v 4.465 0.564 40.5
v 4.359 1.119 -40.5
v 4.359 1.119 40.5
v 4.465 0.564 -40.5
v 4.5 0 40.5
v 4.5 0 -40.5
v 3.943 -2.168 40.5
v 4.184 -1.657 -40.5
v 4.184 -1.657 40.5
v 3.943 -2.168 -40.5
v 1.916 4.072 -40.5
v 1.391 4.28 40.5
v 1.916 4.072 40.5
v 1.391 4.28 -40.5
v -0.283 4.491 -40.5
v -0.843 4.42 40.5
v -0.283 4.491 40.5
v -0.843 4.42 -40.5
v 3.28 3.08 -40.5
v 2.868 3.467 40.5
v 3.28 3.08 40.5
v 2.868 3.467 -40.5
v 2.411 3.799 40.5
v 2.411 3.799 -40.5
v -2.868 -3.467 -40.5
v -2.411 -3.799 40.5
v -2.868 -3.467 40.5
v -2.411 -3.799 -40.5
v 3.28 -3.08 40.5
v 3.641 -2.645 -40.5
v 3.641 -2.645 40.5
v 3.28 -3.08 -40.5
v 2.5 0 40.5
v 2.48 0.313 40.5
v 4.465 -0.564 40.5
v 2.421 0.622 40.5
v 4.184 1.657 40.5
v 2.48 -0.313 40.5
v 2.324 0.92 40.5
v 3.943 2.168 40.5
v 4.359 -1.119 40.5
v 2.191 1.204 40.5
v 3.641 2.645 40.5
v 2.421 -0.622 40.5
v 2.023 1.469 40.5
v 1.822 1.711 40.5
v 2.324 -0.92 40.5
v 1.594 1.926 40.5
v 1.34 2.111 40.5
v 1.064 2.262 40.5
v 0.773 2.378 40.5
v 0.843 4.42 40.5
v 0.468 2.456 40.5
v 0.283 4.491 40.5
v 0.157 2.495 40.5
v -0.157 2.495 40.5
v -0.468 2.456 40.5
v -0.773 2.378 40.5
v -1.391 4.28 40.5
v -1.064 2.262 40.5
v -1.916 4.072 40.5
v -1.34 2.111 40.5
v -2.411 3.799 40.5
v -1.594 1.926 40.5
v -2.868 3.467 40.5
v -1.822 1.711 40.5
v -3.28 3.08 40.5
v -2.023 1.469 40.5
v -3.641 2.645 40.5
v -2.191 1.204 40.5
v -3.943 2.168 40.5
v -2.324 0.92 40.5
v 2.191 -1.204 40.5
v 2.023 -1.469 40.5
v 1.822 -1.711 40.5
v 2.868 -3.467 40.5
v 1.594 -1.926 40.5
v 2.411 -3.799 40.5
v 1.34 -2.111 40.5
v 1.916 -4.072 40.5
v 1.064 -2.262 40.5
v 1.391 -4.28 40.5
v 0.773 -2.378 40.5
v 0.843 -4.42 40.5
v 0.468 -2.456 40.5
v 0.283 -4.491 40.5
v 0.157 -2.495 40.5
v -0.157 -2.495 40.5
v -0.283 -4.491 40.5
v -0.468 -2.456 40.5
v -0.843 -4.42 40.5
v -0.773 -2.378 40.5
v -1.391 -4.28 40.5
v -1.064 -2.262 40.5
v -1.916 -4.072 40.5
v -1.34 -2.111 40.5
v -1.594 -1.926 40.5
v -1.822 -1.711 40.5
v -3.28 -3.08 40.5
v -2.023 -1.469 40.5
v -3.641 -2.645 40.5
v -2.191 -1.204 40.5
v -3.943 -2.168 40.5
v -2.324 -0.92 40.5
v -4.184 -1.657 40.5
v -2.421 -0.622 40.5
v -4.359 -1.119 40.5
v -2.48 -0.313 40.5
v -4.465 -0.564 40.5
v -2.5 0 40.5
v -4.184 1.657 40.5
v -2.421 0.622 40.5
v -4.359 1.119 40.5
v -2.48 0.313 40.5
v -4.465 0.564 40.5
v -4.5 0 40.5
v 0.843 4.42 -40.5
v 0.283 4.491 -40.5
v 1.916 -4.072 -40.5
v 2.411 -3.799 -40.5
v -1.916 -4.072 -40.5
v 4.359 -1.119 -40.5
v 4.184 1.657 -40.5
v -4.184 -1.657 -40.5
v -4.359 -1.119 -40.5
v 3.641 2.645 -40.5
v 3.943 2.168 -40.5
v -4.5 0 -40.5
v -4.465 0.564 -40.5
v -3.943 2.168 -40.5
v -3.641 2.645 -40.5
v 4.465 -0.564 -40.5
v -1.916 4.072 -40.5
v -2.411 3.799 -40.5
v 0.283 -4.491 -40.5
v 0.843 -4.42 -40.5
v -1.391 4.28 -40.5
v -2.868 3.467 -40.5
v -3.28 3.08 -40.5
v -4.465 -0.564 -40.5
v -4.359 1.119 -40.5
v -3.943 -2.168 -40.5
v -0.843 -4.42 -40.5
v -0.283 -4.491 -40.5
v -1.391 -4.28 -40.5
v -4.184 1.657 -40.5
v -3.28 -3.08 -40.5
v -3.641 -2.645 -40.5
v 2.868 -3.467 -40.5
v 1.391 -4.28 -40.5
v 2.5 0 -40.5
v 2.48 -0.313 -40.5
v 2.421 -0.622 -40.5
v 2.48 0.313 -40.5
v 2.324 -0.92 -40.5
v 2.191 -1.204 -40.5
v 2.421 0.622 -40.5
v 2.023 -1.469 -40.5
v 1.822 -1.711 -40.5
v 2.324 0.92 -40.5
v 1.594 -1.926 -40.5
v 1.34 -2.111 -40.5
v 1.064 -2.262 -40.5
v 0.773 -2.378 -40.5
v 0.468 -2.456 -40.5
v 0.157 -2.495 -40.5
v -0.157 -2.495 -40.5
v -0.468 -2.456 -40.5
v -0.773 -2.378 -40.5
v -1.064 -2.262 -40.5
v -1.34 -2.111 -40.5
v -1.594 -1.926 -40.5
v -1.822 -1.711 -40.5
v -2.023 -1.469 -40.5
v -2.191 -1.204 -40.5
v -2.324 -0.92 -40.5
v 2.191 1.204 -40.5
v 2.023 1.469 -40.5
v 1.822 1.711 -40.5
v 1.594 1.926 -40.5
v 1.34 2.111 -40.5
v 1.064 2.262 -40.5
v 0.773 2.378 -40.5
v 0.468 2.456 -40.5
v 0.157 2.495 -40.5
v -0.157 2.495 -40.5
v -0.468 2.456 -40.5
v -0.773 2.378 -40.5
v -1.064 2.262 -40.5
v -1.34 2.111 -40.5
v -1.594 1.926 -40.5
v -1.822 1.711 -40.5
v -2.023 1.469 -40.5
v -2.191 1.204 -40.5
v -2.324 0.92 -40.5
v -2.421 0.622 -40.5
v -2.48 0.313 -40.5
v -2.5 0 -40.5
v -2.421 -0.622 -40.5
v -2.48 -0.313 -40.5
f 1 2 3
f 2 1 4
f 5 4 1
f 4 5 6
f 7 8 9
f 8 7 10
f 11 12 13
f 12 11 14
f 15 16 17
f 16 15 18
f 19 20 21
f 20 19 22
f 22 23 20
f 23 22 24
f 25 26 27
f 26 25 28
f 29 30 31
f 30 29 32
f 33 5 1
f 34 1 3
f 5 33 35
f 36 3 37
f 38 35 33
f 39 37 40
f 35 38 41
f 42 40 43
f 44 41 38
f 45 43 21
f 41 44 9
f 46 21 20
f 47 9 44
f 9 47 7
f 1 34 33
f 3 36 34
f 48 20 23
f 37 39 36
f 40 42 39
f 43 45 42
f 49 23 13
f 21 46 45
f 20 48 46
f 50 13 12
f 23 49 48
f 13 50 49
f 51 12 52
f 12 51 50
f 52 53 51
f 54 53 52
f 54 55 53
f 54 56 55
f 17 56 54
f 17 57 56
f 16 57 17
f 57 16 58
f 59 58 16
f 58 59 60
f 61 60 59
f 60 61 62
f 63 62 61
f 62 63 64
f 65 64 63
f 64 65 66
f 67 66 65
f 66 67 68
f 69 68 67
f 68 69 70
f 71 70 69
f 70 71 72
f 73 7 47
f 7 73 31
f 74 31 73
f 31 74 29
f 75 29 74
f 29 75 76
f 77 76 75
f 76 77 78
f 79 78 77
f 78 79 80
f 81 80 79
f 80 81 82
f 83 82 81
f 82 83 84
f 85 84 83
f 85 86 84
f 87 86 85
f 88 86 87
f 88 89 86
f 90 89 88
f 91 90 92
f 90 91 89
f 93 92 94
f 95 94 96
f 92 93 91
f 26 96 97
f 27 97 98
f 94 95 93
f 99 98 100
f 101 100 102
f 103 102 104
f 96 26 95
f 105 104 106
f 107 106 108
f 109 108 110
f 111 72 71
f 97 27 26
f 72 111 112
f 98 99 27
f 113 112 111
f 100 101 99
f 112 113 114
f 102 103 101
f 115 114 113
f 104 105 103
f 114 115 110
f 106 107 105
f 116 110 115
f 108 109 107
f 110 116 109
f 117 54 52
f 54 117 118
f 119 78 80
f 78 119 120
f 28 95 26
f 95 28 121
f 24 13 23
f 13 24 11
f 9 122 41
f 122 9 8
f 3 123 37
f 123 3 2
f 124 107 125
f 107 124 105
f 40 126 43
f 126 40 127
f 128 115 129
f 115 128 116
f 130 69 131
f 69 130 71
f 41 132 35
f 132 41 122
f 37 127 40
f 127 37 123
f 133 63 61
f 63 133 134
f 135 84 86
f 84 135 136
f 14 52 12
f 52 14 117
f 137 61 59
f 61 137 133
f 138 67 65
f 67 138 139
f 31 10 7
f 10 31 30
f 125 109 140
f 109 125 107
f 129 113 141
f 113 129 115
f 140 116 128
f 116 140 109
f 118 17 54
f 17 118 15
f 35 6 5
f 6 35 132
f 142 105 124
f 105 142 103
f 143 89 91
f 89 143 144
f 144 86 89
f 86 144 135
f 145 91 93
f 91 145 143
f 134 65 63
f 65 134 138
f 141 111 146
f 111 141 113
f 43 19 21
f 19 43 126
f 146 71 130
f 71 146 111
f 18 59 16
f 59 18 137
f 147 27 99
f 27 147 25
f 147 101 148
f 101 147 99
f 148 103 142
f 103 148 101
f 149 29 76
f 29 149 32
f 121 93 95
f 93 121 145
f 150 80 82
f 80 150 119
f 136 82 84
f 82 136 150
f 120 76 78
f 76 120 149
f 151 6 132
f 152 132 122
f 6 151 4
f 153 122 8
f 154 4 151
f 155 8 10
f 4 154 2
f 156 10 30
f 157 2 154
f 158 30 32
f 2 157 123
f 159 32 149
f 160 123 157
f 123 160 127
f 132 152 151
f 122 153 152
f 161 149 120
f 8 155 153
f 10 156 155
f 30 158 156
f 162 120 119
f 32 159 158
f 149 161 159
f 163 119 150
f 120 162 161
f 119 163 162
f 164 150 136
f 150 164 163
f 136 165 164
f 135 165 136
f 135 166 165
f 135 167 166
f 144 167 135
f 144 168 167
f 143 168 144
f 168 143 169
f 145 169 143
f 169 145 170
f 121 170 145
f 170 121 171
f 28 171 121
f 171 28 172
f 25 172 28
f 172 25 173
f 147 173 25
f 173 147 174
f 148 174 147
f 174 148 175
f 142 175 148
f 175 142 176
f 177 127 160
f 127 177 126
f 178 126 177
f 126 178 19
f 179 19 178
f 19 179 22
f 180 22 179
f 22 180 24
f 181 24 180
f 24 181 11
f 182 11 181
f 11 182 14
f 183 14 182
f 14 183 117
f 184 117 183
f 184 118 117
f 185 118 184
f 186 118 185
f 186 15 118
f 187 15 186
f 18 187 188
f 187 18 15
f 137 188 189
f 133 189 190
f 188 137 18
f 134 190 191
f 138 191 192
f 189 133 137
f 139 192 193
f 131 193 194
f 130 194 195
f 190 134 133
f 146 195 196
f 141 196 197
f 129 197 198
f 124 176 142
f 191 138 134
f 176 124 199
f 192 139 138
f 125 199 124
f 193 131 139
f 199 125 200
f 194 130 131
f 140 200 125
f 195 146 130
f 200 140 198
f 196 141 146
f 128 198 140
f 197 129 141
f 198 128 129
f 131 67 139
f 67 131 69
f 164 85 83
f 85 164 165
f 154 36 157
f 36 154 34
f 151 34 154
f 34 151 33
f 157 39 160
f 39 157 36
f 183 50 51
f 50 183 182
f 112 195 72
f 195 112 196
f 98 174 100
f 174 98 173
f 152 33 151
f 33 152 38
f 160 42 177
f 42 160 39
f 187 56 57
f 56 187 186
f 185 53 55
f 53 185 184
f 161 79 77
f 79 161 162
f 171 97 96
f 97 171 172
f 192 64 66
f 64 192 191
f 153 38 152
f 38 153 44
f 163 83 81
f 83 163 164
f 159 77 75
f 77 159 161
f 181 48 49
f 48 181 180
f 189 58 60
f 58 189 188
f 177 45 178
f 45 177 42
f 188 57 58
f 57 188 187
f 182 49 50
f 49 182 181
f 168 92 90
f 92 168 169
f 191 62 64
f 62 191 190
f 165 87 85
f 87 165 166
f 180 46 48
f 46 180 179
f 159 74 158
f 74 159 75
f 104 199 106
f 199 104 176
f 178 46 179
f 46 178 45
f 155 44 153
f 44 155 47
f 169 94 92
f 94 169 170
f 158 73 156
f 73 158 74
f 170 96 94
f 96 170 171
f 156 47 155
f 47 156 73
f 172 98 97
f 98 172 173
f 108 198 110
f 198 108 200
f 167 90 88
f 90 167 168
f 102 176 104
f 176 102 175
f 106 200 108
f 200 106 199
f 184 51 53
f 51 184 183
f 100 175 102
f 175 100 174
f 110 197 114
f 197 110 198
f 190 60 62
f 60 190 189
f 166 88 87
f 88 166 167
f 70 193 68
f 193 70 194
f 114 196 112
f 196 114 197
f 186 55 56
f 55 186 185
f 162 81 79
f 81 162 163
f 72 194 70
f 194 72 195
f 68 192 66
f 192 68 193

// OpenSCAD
$fn = 50;


difference() {
	union() {
		translate(v = [0, 0, -40.5000000000]) {
			cylinder(h = 81, r = 4.5000000000);
		}
	}
	union() {
		translate(v = [0, 0, -100.0000000000]) {
			cylinder(h = 200, r = 2.5000000000);
		}
	}
}
